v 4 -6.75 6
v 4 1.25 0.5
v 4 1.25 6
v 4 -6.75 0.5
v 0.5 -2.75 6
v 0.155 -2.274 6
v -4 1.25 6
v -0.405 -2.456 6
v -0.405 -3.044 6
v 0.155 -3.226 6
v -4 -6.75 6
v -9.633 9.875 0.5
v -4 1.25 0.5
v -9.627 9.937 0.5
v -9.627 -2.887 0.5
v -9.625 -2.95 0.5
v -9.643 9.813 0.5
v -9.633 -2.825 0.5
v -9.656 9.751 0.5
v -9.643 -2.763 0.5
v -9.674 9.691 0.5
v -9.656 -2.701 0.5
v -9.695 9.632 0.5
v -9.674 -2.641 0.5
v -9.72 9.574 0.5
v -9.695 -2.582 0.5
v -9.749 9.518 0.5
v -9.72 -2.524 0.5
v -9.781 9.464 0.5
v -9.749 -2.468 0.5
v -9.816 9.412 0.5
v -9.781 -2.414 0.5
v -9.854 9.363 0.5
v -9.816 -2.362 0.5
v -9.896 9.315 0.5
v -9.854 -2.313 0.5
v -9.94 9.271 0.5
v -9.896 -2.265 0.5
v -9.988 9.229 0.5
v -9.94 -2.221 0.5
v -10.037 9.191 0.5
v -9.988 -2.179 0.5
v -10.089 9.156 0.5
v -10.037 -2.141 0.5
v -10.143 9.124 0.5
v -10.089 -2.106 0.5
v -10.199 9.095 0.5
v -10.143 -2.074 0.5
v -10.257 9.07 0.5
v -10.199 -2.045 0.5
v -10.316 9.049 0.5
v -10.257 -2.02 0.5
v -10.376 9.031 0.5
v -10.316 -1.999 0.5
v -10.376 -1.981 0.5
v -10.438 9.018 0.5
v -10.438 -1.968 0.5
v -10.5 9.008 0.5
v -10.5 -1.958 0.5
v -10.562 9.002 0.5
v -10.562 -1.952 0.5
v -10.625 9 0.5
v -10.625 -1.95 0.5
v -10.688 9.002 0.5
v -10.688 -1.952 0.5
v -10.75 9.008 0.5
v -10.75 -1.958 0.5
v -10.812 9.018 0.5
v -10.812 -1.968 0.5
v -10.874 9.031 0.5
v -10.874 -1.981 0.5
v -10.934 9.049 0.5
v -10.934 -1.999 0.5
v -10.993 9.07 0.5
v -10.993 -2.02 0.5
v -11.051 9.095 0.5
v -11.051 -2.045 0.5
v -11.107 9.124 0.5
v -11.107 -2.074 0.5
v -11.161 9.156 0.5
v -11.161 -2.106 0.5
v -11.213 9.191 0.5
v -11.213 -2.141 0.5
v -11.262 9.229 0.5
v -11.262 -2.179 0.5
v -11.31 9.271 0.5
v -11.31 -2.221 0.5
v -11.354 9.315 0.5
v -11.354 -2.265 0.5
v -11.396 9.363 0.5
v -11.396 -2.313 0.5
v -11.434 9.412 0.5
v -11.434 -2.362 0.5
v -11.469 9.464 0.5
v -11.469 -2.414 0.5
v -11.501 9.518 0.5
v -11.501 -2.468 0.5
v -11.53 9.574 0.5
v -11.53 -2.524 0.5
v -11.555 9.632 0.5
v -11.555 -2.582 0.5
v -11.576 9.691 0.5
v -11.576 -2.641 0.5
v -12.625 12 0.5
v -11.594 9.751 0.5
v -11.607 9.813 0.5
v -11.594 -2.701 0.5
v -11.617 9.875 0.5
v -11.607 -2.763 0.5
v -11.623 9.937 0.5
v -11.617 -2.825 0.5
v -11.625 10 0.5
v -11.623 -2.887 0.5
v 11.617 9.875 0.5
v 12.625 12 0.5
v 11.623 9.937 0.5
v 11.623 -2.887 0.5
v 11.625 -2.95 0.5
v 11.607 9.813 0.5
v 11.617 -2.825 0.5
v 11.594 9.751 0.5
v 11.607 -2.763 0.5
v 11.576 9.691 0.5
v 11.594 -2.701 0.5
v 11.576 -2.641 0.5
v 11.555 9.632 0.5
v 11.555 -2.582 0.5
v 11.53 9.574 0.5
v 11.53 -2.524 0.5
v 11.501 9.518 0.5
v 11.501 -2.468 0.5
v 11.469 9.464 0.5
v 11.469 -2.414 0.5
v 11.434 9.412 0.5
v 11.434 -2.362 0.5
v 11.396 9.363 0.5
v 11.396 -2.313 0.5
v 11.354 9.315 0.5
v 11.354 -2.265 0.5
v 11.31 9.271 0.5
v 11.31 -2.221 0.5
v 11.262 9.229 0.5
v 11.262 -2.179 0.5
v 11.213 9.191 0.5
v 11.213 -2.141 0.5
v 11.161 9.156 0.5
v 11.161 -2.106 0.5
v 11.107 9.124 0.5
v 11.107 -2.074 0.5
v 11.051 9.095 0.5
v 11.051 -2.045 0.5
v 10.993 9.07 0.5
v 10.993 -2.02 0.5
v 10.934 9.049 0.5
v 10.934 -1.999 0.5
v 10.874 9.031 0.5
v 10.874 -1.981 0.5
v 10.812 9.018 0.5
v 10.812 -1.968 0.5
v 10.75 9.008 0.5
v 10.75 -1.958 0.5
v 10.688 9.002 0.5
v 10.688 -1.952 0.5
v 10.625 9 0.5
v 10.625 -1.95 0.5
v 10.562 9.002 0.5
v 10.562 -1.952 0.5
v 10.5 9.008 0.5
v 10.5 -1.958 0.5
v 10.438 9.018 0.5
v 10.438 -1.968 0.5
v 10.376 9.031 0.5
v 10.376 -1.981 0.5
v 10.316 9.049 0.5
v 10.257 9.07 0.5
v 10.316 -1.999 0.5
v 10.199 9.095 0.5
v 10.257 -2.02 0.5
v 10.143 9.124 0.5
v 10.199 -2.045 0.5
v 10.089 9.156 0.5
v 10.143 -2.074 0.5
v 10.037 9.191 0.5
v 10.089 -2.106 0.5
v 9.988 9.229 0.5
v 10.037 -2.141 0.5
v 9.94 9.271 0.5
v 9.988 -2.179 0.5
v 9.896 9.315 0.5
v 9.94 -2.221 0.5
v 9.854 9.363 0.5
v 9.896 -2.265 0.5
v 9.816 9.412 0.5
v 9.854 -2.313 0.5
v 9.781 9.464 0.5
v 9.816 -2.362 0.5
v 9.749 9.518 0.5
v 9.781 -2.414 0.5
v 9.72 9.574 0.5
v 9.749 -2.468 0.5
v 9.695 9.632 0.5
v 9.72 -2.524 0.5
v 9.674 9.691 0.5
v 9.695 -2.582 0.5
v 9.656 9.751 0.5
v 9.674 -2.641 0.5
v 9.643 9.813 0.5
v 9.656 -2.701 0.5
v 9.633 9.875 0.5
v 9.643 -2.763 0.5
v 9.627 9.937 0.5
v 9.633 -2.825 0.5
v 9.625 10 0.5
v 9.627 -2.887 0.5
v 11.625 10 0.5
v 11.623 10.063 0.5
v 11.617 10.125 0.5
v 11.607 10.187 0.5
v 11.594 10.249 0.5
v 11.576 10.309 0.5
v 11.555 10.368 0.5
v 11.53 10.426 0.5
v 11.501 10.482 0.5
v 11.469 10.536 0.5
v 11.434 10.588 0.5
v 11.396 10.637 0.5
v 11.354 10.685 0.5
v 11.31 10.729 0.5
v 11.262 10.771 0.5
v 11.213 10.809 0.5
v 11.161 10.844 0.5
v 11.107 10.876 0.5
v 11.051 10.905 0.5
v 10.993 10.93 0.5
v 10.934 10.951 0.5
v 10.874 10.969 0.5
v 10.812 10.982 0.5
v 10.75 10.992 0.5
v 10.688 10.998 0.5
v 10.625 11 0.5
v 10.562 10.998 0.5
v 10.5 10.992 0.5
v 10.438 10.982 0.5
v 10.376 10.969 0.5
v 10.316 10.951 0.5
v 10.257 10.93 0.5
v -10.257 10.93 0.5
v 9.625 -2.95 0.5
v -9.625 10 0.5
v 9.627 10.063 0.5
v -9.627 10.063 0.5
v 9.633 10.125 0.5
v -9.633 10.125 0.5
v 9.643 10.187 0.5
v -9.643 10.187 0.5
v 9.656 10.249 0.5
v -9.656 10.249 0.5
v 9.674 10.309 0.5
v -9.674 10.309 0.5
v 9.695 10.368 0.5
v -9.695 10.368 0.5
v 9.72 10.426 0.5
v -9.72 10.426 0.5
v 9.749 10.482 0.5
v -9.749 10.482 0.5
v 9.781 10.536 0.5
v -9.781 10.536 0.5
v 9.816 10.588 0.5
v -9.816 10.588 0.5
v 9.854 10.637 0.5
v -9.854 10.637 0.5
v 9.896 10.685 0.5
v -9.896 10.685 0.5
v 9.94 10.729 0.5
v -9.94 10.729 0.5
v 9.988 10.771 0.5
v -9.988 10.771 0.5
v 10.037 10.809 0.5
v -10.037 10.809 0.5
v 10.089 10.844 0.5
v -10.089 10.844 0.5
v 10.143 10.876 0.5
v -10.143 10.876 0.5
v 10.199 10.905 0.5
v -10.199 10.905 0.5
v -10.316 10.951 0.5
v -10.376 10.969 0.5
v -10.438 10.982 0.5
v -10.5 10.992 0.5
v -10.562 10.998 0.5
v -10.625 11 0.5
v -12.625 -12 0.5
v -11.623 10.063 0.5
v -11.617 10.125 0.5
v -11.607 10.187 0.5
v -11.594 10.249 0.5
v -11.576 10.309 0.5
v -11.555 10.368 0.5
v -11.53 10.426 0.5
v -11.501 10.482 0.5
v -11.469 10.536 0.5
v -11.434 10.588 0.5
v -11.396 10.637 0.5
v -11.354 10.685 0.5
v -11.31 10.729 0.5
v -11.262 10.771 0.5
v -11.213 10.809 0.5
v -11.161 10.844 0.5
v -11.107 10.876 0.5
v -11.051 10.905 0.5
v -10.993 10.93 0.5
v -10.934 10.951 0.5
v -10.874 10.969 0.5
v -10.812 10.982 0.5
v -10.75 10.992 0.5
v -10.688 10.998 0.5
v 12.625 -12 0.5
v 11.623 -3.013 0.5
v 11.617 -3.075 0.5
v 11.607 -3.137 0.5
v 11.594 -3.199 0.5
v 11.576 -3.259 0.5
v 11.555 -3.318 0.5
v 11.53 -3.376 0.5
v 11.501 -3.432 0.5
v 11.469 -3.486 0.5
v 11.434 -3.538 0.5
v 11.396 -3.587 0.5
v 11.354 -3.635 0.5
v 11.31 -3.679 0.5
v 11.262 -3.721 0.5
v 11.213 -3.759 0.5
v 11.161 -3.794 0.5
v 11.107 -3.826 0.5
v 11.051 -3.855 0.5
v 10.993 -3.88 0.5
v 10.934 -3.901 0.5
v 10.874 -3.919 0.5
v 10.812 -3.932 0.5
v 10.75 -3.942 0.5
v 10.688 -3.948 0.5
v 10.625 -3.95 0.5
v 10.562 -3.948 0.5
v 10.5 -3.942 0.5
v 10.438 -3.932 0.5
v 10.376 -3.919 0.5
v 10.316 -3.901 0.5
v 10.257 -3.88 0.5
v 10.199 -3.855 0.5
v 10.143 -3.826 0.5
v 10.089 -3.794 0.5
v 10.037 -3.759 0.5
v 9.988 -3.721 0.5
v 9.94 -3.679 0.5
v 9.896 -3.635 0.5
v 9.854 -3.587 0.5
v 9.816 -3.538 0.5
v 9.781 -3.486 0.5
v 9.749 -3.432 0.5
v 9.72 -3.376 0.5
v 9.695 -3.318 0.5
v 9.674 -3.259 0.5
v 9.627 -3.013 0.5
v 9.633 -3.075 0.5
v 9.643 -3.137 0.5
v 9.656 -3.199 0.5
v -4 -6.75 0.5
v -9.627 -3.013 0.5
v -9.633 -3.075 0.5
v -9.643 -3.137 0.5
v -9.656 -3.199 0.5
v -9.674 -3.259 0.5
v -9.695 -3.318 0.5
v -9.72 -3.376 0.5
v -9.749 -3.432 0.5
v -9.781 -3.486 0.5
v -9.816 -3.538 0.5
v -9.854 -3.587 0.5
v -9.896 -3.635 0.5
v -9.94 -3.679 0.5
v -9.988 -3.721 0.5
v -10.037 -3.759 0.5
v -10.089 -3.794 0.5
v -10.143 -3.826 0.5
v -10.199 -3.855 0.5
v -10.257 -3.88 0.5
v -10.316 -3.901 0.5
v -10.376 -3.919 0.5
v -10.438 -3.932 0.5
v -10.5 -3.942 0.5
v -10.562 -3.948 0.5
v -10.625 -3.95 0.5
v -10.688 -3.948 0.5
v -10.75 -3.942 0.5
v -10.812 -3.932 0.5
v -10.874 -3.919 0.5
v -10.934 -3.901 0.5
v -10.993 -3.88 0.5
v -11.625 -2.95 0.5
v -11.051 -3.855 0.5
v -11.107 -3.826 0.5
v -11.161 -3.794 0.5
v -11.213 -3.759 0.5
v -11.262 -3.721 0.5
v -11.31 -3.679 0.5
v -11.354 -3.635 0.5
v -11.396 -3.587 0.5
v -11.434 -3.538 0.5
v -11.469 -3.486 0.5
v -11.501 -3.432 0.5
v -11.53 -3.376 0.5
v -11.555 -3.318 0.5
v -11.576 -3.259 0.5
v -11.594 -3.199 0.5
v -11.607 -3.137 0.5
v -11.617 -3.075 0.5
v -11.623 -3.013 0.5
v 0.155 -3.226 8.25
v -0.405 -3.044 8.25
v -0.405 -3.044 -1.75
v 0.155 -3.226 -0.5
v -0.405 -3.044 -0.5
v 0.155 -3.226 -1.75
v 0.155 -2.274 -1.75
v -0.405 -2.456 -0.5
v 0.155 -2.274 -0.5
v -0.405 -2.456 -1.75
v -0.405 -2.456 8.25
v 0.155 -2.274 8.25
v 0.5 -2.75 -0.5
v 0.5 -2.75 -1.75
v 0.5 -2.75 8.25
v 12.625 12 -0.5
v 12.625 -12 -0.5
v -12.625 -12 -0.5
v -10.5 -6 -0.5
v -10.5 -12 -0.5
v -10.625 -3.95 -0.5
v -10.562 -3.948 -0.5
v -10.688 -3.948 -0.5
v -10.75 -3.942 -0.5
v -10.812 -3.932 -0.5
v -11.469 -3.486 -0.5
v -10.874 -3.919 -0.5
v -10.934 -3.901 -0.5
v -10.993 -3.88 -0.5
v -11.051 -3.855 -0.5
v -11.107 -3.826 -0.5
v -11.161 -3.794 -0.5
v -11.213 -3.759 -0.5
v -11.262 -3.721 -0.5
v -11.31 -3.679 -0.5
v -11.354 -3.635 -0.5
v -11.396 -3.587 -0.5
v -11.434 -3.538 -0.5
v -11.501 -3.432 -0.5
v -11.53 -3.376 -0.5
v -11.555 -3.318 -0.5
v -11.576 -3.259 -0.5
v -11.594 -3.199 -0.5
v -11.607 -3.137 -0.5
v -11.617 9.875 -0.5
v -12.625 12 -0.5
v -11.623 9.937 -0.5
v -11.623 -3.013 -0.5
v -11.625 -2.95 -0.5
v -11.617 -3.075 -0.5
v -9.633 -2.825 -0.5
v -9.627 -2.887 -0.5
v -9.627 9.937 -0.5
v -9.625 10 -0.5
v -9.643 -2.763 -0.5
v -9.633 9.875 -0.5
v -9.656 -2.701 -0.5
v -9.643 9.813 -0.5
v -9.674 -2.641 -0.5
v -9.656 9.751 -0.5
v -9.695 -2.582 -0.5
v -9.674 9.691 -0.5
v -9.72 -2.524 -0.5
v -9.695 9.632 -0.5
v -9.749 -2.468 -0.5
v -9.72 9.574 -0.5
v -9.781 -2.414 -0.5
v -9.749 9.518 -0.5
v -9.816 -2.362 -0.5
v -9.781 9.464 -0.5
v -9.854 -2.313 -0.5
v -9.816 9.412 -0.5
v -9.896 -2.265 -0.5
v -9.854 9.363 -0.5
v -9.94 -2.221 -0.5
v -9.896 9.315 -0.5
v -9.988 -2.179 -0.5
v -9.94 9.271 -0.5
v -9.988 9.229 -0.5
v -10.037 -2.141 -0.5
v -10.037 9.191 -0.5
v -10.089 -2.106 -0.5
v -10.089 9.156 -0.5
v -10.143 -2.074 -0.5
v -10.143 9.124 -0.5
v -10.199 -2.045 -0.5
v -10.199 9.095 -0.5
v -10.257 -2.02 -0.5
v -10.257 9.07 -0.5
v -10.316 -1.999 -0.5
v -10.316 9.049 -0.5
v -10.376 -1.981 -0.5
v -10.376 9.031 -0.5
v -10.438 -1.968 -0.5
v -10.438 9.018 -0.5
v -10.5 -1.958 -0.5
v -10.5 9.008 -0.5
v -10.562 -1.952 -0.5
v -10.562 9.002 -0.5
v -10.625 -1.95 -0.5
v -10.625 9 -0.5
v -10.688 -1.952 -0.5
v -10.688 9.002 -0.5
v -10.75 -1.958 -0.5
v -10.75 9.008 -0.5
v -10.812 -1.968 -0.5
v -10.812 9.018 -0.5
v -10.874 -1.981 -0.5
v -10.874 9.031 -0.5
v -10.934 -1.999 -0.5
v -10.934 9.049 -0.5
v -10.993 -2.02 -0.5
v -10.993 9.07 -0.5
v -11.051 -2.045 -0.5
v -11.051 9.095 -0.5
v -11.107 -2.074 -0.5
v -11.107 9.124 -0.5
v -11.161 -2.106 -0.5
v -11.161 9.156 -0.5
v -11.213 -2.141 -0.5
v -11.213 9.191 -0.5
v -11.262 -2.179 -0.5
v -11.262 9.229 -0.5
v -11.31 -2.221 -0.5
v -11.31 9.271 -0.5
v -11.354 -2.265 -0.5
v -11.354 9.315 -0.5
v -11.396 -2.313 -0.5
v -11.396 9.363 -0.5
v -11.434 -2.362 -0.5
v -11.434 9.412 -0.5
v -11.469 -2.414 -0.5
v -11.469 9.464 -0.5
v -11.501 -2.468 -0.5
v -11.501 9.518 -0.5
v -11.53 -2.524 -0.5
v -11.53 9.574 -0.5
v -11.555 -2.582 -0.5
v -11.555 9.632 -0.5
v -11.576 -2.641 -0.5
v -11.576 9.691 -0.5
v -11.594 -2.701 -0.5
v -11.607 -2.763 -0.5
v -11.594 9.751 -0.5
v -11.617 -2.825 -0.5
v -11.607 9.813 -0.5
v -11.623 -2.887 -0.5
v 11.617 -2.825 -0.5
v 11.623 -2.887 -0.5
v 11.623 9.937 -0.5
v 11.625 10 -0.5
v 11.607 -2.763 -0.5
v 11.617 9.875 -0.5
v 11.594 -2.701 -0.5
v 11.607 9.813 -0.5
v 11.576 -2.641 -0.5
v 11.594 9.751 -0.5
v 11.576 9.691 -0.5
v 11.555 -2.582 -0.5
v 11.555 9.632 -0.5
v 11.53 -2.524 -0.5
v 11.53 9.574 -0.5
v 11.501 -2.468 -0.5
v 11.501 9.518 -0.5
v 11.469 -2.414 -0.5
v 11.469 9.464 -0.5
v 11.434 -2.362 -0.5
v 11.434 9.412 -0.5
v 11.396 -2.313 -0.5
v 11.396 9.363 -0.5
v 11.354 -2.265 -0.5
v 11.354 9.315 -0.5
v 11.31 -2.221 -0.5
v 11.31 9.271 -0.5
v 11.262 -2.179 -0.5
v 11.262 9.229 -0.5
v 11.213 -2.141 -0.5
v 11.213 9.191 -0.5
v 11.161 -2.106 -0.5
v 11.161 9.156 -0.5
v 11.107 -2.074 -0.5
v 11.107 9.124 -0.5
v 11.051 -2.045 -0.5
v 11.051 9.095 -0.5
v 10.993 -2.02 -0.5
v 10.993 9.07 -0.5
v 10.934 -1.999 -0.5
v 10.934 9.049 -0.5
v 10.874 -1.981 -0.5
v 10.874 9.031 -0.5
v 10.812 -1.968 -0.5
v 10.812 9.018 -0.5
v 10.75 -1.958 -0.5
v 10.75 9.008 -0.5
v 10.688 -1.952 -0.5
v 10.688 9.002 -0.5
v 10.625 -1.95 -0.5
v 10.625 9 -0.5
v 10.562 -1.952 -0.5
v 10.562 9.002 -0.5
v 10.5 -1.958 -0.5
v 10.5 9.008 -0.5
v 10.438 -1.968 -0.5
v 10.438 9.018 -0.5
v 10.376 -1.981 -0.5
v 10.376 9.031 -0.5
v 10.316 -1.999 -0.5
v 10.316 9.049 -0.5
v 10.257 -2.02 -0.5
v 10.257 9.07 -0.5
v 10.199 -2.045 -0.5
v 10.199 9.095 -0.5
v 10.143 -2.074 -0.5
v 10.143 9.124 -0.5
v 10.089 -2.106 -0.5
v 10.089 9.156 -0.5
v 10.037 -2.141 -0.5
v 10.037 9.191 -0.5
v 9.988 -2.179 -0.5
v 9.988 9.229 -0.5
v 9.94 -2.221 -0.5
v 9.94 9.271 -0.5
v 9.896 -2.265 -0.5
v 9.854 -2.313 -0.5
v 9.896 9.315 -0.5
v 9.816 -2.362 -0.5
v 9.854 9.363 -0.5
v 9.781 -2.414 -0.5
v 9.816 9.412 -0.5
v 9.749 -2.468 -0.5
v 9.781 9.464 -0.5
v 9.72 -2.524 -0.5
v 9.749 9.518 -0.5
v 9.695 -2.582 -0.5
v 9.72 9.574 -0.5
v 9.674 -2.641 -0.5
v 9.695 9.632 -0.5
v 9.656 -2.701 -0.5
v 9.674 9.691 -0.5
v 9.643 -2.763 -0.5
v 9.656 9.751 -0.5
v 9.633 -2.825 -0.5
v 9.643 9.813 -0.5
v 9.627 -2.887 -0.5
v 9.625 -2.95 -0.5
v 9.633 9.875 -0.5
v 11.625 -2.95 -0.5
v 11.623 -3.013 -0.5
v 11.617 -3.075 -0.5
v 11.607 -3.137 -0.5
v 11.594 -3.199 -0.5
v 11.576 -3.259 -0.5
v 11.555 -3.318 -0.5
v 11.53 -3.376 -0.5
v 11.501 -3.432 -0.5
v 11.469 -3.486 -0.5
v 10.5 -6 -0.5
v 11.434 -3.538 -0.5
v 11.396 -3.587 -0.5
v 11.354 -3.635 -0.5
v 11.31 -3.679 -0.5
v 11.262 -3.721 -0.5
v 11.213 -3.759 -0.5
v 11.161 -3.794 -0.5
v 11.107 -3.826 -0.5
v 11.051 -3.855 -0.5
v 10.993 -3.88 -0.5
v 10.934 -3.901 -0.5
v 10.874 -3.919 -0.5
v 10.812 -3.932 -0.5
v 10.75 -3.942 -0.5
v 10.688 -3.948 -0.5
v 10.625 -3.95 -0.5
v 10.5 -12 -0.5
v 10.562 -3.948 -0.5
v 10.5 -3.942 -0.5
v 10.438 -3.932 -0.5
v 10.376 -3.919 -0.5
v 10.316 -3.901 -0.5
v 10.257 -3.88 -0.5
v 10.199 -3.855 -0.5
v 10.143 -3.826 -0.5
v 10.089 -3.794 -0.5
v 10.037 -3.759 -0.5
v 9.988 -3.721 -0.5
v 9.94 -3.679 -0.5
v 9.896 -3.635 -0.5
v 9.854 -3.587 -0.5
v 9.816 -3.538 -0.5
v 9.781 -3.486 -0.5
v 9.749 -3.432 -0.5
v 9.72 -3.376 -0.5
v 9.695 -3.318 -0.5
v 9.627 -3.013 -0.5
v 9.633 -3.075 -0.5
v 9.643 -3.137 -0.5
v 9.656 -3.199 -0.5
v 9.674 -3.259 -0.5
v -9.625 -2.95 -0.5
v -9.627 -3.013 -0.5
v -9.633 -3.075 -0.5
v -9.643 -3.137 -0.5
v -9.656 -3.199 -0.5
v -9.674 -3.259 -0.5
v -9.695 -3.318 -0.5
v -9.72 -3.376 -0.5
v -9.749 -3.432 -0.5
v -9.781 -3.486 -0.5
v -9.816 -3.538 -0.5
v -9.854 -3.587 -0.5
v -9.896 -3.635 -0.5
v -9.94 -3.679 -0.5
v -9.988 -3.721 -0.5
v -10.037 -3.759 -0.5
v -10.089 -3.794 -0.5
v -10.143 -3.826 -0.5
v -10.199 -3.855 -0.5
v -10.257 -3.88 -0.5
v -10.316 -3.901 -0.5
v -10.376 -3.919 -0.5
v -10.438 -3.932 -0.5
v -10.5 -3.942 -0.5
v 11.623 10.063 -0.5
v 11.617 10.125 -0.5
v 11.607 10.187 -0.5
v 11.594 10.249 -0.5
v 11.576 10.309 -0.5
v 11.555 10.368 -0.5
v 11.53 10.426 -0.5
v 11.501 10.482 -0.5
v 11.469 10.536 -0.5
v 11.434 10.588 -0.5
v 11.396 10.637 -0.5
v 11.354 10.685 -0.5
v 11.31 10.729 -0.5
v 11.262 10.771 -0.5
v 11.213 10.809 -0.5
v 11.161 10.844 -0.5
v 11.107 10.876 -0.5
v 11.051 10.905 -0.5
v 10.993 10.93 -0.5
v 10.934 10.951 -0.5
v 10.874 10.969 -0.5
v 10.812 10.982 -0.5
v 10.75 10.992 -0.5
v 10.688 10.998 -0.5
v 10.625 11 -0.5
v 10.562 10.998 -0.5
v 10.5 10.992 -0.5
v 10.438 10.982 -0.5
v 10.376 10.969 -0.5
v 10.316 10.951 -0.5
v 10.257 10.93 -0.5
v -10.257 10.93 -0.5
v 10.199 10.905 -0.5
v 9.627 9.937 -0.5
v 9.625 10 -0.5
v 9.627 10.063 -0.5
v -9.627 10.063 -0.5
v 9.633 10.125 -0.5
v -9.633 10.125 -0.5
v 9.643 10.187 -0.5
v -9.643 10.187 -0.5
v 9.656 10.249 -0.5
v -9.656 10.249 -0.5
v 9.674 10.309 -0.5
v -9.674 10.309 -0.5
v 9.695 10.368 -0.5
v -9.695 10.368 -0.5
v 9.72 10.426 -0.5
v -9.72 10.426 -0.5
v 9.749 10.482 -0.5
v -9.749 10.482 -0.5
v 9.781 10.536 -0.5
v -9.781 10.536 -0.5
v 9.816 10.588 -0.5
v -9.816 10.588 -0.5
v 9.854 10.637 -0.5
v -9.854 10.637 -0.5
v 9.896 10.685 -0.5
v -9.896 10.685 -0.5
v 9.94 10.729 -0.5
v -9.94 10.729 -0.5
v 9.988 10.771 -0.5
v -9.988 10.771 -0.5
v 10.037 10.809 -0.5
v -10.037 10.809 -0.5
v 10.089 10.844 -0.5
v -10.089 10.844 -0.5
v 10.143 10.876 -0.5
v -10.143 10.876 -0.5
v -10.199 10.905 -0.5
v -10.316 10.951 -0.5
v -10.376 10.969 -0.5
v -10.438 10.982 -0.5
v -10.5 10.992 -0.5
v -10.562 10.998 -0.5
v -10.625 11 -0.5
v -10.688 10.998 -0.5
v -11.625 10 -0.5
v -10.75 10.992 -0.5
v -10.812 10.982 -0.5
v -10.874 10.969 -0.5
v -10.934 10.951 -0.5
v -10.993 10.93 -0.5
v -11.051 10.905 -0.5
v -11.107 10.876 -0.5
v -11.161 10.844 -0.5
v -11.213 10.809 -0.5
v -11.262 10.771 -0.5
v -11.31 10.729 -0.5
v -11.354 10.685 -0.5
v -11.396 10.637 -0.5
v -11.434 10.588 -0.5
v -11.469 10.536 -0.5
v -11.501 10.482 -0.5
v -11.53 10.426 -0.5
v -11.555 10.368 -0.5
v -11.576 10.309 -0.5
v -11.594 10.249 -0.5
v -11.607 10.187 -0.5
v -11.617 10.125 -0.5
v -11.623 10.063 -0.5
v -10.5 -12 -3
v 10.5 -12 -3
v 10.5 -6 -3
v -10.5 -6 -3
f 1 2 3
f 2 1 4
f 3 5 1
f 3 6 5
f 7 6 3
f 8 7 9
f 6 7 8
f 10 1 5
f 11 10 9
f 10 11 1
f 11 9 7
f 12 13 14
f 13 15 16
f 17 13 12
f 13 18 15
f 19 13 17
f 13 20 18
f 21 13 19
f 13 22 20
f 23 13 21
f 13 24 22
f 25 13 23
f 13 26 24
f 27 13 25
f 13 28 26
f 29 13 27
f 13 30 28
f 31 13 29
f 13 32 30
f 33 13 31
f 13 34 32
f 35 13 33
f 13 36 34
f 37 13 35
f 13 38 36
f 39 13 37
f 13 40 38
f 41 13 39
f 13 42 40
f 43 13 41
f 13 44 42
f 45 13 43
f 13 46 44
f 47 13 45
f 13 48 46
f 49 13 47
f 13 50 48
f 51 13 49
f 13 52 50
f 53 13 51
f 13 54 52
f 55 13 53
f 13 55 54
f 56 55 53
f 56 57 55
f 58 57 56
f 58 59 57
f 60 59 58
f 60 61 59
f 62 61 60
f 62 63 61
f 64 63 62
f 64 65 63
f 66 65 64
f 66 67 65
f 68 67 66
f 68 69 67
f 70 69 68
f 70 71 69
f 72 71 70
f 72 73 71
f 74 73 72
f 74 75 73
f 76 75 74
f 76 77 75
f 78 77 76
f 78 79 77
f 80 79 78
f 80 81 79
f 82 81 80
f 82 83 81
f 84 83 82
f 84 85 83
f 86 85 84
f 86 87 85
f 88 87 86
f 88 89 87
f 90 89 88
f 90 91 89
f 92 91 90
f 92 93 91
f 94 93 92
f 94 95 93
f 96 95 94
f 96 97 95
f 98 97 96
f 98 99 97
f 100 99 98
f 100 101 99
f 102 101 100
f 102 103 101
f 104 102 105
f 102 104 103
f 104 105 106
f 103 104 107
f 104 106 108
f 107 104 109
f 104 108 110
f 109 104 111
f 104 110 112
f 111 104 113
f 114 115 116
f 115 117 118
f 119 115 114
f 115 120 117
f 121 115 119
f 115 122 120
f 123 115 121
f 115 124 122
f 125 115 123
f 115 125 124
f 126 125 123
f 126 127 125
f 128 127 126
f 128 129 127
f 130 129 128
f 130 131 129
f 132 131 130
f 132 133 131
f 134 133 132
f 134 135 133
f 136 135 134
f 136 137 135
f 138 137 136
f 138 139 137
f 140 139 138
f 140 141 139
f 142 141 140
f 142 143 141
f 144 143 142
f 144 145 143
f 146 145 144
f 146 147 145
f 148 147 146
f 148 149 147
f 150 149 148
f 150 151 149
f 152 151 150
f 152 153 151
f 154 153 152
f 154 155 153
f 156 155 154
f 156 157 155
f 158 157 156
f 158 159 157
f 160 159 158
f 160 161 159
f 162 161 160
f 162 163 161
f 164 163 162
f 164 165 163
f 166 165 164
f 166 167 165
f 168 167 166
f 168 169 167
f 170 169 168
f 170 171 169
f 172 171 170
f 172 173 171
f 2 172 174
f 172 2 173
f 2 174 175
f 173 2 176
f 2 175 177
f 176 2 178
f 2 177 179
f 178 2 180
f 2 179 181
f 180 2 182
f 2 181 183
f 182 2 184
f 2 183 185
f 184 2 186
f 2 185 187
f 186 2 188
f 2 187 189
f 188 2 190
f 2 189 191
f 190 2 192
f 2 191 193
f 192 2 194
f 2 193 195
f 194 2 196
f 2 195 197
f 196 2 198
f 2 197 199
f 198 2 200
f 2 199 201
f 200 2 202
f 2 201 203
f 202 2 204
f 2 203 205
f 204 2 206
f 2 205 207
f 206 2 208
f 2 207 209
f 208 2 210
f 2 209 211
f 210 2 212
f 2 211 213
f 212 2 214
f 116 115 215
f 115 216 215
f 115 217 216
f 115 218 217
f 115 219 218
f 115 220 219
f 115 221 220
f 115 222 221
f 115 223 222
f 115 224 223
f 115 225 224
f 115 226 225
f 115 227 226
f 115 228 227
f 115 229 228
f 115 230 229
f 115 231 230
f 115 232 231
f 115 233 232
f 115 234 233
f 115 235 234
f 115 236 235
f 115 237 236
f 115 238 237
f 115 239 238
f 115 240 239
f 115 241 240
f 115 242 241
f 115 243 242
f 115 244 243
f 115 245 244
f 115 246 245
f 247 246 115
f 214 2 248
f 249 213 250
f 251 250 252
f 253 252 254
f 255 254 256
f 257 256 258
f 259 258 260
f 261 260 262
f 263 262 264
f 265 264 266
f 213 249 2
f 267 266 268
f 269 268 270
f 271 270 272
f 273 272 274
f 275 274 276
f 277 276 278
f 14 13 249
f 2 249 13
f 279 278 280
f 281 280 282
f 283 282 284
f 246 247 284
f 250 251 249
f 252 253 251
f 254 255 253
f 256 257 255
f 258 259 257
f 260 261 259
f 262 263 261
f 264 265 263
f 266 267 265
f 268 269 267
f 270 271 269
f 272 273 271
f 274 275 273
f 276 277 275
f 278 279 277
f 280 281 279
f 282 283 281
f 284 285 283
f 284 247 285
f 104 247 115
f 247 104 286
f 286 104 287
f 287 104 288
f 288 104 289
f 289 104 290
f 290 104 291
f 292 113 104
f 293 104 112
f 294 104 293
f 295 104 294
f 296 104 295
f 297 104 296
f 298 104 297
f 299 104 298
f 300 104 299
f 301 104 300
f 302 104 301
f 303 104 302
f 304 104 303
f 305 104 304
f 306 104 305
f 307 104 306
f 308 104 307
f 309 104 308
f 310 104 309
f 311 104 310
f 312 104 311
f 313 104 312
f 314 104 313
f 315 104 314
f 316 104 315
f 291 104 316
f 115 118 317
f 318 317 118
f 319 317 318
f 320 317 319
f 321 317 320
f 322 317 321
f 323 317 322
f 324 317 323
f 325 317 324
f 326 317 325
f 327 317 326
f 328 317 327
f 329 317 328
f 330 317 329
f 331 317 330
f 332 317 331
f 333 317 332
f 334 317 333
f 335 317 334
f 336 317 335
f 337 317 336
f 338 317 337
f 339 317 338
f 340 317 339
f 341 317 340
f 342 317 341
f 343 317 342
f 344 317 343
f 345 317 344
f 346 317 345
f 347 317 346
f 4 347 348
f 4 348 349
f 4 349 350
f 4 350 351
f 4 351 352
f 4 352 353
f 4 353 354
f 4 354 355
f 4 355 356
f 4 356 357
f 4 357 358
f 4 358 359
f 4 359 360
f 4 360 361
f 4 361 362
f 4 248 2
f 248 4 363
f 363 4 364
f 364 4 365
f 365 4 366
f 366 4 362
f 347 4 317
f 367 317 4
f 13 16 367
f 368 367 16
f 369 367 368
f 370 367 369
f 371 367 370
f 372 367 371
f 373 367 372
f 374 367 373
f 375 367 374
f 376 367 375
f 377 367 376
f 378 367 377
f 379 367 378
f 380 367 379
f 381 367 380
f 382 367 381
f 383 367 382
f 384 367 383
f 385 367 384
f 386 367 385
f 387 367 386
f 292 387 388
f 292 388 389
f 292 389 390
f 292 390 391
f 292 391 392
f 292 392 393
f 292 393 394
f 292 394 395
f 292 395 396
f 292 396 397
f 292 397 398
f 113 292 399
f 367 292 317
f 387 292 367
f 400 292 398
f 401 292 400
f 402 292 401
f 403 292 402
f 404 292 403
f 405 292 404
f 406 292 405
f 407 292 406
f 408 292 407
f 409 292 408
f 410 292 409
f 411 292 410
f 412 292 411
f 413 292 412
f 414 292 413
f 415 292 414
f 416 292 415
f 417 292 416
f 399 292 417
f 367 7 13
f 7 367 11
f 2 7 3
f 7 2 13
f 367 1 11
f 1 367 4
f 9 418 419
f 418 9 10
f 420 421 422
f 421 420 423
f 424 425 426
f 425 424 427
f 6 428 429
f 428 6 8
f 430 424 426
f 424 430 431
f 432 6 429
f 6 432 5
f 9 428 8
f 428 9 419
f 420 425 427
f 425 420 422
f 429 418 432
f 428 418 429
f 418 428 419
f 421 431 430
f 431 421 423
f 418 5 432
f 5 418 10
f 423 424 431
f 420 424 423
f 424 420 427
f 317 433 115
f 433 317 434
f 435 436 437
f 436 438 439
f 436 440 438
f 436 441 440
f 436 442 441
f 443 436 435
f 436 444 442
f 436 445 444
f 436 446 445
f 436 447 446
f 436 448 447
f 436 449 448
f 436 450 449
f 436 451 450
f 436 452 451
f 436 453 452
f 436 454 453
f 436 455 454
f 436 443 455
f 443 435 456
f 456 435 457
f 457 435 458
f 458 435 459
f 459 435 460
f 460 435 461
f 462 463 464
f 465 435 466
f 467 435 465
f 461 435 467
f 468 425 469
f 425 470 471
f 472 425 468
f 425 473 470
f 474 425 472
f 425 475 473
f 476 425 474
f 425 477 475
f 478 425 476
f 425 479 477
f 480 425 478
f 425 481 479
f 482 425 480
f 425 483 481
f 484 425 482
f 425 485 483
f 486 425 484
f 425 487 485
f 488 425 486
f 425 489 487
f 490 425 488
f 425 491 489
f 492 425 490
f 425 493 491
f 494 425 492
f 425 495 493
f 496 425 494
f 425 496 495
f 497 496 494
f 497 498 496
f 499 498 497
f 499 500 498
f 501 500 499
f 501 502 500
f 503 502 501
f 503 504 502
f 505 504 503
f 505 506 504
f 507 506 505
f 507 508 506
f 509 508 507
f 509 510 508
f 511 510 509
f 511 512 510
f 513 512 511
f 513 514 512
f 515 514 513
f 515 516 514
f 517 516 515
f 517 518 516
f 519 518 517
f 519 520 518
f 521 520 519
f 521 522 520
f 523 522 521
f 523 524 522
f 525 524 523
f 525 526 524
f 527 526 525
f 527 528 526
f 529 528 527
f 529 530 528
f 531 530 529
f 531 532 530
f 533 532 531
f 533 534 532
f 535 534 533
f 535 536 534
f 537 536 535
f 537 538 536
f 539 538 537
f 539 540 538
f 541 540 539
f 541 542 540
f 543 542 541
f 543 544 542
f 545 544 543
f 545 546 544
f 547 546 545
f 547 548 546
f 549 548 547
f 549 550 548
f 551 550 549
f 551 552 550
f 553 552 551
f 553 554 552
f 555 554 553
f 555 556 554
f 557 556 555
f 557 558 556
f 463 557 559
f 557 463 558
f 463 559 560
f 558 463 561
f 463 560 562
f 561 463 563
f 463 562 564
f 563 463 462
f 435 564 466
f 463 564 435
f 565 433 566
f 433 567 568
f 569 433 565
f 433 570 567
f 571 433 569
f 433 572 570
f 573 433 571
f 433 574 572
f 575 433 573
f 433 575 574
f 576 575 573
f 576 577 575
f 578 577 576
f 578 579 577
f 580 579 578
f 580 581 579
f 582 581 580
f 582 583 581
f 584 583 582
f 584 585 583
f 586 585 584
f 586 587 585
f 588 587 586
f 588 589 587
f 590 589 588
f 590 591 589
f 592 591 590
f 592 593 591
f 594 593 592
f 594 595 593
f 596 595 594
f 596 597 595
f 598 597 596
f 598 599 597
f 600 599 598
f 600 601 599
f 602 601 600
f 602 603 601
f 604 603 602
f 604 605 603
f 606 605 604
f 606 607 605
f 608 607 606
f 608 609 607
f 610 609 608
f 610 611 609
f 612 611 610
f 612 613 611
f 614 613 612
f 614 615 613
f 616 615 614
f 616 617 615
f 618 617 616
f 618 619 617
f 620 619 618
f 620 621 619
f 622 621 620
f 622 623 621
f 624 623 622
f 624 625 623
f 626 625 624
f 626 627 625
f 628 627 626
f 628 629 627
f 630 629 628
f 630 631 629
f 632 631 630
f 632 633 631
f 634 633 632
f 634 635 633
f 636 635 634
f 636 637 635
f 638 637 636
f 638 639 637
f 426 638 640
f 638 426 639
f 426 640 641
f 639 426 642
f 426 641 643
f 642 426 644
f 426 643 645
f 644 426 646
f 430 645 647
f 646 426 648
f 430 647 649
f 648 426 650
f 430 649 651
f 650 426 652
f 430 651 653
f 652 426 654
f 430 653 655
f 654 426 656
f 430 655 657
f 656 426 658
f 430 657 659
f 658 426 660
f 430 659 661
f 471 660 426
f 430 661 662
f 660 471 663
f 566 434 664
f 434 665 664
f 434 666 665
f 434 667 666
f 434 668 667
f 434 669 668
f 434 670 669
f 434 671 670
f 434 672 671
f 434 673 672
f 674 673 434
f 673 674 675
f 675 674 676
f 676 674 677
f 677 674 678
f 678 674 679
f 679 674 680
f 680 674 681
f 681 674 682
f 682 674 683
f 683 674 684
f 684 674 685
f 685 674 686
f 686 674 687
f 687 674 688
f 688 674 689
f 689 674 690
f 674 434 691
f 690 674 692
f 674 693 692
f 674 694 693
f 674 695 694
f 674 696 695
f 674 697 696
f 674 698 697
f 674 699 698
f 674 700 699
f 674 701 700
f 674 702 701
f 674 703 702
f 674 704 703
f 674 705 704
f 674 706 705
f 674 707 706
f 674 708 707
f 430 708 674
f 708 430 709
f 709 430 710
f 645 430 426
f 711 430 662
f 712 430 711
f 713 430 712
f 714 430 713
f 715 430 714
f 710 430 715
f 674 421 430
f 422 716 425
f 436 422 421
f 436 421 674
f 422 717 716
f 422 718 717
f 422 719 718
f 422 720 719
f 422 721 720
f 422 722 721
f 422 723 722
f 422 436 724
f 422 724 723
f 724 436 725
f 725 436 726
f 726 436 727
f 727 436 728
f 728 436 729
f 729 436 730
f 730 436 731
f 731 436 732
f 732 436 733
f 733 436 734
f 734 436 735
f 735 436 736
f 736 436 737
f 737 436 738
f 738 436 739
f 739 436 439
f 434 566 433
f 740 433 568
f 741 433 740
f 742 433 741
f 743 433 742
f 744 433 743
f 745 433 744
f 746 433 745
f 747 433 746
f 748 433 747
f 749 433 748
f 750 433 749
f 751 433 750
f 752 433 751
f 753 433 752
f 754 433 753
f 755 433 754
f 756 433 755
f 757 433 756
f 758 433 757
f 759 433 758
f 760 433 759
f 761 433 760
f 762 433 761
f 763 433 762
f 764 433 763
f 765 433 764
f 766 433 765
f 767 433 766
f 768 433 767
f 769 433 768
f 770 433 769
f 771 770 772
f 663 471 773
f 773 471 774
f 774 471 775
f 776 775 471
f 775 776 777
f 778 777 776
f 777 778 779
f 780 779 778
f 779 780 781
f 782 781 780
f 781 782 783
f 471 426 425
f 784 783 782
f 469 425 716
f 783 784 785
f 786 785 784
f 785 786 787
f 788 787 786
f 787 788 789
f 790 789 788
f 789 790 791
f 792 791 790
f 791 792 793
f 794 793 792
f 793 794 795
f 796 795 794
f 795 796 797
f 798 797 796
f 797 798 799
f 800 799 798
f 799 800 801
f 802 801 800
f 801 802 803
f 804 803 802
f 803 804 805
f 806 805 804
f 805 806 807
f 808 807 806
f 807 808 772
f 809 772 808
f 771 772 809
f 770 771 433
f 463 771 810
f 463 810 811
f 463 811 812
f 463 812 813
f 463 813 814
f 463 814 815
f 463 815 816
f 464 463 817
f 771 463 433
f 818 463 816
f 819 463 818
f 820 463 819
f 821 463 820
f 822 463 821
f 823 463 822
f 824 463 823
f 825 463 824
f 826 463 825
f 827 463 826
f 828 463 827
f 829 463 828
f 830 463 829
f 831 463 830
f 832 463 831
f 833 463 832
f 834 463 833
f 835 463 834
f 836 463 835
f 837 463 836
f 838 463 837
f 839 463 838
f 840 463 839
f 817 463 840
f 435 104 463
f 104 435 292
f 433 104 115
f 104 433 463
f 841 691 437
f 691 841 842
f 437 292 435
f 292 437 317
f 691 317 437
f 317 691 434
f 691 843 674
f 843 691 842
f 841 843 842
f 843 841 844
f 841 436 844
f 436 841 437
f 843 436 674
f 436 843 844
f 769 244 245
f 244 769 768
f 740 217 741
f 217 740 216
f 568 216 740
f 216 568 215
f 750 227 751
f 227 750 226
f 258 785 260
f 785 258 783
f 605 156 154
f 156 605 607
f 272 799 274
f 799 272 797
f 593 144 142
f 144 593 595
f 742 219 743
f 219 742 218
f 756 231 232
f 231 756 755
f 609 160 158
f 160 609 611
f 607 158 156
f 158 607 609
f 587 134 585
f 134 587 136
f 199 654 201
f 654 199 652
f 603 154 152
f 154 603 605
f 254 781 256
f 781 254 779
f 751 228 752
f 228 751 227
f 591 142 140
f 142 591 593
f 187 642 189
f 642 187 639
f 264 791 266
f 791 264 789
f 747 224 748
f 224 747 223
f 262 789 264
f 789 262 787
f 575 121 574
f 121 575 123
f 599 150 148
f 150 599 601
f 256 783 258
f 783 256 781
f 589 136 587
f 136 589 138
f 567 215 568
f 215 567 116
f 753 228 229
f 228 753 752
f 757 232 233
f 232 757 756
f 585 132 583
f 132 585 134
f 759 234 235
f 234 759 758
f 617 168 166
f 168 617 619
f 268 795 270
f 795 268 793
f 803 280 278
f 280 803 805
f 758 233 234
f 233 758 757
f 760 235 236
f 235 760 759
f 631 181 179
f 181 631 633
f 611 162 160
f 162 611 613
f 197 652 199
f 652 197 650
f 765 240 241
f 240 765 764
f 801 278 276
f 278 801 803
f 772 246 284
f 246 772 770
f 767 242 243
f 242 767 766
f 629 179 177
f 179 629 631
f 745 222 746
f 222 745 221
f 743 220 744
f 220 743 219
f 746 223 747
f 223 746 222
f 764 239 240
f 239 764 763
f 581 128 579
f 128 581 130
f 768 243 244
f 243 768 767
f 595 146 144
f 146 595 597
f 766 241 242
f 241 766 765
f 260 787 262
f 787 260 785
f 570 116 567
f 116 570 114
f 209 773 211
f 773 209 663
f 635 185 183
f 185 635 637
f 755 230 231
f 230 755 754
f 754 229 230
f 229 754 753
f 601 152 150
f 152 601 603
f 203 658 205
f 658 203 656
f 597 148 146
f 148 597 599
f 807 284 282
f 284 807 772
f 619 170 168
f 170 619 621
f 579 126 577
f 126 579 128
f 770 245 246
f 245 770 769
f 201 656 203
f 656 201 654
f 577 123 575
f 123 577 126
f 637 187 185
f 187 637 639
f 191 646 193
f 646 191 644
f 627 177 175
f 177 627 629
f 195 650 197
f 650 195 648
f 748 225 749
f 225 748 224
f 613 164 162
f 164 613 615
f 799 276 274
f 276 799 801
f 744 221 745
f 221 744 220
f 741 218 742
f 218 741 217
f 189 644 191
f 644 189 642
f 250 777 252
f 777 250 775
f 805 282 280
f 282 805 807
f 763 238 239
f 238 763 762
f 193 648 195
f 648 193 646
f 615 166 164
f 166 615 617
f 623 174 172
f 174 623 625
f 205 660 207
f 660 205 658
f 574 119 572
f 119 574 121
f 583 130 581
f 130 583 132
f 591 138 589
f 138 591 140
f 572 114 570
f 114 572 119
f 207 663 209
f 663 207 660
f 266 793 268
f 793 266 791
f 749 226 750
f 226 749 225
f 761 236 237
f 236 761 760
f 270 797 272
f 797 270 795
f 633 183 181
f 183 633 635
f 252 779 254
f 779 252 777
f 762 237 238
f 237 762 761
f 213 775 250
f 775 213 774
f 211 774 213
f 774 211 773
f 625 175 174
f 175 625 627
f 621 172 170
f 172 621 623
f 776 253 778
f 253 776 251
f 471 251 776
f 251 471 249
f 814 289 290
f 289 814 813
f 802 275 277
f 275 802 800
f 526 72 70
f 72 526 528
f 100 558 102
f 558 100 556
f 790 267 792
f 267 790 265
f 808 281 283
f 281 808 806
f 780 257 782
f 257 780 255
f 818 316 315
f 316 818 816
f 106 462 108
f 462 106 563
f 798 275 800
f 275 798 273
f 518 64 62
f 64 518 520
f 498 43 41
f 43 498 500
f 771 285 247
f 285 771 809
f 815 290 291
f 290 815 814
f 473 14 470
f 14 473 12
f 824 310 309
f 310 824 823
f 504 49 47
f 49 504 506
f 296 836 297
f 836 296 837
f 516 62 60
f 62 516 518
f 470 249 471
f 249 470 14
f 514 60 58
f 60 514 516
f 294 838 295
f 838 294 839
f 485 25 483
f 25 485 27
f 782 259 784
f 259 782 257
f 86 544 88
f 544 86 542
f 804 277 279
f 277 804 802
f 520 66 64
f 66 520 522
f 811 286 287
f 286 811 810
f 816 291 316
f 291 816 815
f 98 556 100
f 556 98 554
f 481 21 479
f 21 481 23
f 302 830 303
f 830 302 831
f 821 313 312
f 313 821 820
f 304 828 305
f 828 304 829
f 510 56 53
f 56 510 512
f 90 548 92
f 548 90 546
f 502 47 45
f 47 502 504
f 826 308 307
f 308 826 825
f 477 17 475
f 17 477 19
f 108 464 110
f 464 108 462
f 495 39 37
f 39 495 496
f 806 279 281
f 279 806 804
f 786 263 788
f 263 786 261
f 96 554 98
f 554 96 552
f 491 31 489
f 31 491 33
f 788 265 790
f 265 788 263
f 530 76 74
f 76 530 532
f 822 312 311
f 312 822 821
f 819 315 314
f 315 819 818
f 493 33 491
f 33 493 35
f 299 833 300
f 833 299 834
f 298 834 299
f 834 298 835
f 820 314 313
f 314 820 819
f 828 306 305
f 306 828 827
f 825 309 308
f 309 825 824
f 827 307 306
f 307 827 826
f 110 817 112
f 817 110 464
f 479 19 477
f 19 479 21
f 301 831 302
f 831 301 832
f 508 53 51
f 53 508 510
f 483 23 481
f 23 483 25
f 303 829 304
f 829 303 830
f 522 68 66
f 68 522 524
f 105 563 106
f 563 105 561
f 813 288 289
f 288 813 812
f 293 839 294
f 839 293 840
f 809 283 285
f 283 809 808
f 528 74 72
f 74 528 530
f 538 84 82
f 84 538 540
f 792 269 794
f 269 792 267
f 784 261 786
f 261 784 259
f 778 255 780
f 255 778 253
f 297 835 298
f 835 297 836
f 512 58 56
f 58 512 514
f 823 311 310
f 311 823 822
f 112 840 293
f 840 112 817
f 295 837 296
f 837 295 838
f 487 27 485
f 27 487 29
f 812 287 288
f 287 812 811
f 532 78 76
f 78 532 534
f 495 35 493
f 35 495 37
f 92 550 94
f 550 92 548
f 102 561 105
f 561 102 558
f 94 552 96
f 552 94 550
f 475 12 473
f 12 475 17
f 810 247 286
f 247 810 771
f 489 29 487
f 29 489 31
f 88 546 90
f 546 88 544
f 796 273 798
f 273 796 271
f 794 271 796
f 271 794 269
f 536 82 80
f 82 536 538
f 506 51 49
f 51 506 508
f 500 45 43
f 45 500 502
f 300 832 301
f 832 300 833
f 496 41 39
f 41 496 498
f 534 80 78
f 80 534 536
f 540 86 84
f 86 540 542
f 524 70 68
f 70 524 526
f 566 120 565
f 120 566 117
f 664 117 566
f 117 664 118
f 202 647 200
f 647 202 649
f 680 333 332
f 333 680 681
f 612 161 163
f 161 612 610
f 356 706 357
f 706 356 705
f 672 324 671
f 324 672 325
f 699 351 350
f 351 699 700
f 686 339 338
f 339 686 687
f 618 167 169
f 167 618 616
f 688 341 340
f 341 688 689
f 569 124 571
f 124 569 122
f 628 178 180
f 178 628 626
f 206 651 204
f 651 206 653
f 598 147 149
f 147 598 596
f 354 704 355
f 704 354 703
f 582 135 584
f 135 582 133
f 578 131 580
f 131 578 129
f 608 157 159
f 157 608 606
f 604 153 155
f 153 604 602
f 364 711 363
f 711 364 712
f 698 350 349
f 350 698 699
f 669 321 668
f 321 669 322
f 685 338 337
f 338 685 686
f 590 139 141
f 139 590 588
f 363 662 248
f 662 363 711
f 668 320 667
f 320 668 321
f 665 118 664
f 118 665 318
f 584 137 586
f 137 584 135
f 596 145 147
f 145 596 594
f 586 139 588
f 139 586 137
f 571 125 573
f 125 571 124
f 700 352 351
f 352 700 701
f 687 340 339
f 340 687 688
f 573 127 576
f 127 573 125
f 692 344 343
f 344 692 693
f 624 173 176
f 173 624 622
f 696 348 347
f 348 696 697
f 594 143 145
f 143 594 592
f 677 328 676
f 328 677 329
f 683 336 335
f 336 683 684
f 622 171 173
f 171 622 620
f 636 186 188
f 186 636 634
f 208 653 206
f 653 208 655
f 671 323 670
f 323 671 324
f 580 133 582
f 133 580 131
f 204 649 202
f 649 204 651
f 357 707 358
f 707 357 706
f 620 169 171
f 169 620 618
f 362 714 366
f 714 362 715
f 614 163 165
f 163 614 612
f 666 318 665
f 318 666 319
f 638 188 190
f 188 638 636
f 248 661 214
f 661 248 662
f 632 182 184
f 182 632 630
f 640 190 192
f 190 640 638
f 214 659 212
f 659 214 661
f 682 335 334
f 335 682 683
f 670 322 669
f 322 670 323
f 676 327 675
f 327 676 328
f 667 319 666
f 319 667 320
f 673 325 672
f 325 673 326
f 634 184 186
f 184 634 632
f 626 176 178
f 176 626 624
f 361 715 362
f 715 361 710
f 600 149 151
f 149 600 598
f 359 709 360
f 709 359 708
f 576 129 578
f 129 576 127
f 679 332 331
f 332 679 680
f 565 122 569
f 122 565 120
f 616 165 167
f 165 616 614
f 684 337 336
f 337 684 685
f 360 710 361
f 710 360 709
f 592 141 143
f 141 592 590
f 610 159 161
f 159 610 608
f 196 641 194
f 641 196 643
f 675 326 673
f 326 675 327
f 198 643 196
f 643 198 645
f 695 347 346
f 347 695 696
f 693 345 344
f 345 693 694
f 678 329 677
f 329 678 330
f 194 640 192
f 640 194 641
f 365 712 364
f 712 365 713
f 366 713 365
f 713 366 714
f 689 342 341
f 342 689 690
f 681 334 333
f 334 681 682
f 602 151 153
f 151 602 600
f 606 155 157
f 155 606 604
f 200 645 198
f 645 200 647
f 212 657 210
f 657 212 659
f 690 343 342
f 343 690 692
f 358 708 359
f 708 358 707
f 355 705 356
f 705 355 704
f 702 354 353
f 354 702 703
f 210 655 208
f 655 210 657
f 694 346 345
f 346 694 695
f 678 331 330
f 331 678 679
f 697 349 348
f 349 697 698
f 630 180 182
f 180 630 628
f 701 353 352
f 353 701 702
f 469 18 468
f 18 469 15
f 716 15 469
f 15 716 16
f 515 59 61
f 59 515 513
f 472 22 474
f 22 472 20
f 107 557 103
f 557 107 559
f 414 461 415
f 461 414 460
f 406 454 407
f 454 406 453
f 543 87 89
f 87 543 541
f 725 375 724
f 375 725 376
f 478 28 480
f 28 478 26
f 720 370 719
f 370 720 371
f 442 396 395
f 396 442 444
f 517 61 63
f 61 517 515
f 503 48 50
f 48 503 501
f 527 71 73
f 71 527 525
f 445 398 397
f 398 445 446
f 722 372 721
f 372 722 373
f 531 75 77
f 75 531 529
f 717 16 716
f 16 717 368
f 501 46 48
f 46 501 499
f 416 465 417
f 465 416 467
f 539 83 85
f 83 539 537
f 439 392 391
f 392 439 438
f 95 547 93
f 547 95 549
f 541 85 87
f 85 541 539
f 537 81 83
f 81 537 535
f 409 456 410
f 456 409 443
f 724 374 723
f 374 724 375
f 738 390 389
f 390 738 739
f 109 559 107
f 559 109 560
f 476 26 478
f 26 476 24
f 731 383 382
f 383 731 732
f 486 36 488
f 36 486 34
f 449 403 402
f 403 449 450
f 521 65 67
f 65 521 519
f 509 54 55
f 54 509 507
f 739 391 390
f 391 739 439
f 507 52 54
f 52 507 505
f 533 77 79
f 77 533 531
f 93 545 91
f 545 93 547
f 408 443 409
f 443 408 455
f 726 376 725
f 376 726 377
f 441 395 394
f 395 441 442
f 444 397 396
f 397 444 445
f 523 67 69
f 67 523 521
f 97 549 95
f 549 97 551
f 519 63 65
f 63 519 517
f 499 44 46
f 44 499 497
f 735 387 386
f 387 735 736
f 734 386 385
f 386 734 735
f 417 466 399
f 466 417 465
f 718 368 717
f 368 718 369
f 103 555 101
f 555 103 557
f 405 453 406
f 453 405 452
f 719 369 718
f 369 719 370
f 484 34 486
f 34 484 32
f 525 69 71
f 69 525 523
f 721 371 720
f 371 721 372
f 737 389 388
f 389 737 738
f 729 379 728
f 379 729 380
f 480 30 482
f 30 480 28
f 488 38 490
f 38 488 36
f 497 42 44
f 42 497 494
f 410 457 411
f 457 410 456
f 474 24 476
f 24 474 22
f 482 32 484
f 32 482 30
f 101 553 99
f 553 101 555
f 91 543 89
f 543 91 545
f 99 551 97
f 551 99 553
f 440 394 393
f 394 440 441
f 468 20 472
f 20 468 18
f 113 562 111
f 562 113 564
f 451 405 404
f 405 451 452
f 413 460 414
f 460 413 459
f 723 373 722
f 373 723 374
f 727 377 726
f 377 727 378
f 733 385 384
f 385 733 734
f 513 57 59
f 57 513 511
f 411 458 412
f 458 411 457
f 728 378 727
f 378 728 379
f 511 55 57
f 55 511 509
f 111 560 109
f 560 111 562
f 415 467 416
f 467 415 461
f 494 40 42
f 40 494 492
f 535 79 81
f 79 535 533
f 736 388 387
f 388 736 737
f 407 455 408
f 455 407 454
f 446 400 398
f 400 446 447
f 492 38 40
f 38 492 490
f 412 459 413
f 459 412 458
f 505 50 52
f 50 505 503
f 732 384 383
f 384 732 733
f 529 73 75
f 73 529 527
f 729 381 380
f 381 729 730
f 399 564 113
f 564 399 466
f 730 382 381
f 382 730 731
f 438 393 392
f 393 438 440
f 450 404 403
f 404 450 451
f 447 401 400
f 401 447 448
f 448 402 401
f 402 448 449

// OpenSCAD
module make_pi_noir_camera_holes(width=25.25, depth=24, height=5, hole_d=2){
    
    translate([width/2-hole_d/2-1,depth/2-hole_d/2-1,0])
    cylinder(d=hole_d, h=height, center=true, $fn=100);
    translate([-(width/2-hole_d/2-1),depth/2-hole_d/2-1,0])
    cylinder(d=hole_d, h=height, center=true, $fn=100);
    
    translate([
        width/2-hole_d/2-1,
        -(depth/2-8.25)+.8,
        0])
    cylinder(d=hole_d, h=height, center=true, $fn=100);
    translate([
        -(width/2-hole_d/2-1),
        -(depth/2-8.25)+.8,
        0])
    cylinder(d=hole_d, h=height, center=true, $fn=100);
    
}

module make_pi_noir_camera(buffer=0){
    width = 25.25;
    depth = 24;

    difference(){
        union(){
    
            // main board
            cube([width,depth,1], center=true);
        
            // camera lense
            translate([0,-depth/2+8/2+5.25,5.5/2+1/2]){
                color("green")
                cube([8+buffer,8+buffer,5.5], center=true);
                color("black")
                cylinder(d=1, h=10, center=true);
            }
        
            // cable jack
            color("green")
            translate([0,-depth/2+6/2,-2.5/2-1/2])
            cube([21,6,2.5], center=true);
    
        }
    
        // mounting holes
        color("blue"){
            make_pi_noir_camera_holes(width=width, depth=depth);
        }
    }
}

make_pi_noir_camera();
